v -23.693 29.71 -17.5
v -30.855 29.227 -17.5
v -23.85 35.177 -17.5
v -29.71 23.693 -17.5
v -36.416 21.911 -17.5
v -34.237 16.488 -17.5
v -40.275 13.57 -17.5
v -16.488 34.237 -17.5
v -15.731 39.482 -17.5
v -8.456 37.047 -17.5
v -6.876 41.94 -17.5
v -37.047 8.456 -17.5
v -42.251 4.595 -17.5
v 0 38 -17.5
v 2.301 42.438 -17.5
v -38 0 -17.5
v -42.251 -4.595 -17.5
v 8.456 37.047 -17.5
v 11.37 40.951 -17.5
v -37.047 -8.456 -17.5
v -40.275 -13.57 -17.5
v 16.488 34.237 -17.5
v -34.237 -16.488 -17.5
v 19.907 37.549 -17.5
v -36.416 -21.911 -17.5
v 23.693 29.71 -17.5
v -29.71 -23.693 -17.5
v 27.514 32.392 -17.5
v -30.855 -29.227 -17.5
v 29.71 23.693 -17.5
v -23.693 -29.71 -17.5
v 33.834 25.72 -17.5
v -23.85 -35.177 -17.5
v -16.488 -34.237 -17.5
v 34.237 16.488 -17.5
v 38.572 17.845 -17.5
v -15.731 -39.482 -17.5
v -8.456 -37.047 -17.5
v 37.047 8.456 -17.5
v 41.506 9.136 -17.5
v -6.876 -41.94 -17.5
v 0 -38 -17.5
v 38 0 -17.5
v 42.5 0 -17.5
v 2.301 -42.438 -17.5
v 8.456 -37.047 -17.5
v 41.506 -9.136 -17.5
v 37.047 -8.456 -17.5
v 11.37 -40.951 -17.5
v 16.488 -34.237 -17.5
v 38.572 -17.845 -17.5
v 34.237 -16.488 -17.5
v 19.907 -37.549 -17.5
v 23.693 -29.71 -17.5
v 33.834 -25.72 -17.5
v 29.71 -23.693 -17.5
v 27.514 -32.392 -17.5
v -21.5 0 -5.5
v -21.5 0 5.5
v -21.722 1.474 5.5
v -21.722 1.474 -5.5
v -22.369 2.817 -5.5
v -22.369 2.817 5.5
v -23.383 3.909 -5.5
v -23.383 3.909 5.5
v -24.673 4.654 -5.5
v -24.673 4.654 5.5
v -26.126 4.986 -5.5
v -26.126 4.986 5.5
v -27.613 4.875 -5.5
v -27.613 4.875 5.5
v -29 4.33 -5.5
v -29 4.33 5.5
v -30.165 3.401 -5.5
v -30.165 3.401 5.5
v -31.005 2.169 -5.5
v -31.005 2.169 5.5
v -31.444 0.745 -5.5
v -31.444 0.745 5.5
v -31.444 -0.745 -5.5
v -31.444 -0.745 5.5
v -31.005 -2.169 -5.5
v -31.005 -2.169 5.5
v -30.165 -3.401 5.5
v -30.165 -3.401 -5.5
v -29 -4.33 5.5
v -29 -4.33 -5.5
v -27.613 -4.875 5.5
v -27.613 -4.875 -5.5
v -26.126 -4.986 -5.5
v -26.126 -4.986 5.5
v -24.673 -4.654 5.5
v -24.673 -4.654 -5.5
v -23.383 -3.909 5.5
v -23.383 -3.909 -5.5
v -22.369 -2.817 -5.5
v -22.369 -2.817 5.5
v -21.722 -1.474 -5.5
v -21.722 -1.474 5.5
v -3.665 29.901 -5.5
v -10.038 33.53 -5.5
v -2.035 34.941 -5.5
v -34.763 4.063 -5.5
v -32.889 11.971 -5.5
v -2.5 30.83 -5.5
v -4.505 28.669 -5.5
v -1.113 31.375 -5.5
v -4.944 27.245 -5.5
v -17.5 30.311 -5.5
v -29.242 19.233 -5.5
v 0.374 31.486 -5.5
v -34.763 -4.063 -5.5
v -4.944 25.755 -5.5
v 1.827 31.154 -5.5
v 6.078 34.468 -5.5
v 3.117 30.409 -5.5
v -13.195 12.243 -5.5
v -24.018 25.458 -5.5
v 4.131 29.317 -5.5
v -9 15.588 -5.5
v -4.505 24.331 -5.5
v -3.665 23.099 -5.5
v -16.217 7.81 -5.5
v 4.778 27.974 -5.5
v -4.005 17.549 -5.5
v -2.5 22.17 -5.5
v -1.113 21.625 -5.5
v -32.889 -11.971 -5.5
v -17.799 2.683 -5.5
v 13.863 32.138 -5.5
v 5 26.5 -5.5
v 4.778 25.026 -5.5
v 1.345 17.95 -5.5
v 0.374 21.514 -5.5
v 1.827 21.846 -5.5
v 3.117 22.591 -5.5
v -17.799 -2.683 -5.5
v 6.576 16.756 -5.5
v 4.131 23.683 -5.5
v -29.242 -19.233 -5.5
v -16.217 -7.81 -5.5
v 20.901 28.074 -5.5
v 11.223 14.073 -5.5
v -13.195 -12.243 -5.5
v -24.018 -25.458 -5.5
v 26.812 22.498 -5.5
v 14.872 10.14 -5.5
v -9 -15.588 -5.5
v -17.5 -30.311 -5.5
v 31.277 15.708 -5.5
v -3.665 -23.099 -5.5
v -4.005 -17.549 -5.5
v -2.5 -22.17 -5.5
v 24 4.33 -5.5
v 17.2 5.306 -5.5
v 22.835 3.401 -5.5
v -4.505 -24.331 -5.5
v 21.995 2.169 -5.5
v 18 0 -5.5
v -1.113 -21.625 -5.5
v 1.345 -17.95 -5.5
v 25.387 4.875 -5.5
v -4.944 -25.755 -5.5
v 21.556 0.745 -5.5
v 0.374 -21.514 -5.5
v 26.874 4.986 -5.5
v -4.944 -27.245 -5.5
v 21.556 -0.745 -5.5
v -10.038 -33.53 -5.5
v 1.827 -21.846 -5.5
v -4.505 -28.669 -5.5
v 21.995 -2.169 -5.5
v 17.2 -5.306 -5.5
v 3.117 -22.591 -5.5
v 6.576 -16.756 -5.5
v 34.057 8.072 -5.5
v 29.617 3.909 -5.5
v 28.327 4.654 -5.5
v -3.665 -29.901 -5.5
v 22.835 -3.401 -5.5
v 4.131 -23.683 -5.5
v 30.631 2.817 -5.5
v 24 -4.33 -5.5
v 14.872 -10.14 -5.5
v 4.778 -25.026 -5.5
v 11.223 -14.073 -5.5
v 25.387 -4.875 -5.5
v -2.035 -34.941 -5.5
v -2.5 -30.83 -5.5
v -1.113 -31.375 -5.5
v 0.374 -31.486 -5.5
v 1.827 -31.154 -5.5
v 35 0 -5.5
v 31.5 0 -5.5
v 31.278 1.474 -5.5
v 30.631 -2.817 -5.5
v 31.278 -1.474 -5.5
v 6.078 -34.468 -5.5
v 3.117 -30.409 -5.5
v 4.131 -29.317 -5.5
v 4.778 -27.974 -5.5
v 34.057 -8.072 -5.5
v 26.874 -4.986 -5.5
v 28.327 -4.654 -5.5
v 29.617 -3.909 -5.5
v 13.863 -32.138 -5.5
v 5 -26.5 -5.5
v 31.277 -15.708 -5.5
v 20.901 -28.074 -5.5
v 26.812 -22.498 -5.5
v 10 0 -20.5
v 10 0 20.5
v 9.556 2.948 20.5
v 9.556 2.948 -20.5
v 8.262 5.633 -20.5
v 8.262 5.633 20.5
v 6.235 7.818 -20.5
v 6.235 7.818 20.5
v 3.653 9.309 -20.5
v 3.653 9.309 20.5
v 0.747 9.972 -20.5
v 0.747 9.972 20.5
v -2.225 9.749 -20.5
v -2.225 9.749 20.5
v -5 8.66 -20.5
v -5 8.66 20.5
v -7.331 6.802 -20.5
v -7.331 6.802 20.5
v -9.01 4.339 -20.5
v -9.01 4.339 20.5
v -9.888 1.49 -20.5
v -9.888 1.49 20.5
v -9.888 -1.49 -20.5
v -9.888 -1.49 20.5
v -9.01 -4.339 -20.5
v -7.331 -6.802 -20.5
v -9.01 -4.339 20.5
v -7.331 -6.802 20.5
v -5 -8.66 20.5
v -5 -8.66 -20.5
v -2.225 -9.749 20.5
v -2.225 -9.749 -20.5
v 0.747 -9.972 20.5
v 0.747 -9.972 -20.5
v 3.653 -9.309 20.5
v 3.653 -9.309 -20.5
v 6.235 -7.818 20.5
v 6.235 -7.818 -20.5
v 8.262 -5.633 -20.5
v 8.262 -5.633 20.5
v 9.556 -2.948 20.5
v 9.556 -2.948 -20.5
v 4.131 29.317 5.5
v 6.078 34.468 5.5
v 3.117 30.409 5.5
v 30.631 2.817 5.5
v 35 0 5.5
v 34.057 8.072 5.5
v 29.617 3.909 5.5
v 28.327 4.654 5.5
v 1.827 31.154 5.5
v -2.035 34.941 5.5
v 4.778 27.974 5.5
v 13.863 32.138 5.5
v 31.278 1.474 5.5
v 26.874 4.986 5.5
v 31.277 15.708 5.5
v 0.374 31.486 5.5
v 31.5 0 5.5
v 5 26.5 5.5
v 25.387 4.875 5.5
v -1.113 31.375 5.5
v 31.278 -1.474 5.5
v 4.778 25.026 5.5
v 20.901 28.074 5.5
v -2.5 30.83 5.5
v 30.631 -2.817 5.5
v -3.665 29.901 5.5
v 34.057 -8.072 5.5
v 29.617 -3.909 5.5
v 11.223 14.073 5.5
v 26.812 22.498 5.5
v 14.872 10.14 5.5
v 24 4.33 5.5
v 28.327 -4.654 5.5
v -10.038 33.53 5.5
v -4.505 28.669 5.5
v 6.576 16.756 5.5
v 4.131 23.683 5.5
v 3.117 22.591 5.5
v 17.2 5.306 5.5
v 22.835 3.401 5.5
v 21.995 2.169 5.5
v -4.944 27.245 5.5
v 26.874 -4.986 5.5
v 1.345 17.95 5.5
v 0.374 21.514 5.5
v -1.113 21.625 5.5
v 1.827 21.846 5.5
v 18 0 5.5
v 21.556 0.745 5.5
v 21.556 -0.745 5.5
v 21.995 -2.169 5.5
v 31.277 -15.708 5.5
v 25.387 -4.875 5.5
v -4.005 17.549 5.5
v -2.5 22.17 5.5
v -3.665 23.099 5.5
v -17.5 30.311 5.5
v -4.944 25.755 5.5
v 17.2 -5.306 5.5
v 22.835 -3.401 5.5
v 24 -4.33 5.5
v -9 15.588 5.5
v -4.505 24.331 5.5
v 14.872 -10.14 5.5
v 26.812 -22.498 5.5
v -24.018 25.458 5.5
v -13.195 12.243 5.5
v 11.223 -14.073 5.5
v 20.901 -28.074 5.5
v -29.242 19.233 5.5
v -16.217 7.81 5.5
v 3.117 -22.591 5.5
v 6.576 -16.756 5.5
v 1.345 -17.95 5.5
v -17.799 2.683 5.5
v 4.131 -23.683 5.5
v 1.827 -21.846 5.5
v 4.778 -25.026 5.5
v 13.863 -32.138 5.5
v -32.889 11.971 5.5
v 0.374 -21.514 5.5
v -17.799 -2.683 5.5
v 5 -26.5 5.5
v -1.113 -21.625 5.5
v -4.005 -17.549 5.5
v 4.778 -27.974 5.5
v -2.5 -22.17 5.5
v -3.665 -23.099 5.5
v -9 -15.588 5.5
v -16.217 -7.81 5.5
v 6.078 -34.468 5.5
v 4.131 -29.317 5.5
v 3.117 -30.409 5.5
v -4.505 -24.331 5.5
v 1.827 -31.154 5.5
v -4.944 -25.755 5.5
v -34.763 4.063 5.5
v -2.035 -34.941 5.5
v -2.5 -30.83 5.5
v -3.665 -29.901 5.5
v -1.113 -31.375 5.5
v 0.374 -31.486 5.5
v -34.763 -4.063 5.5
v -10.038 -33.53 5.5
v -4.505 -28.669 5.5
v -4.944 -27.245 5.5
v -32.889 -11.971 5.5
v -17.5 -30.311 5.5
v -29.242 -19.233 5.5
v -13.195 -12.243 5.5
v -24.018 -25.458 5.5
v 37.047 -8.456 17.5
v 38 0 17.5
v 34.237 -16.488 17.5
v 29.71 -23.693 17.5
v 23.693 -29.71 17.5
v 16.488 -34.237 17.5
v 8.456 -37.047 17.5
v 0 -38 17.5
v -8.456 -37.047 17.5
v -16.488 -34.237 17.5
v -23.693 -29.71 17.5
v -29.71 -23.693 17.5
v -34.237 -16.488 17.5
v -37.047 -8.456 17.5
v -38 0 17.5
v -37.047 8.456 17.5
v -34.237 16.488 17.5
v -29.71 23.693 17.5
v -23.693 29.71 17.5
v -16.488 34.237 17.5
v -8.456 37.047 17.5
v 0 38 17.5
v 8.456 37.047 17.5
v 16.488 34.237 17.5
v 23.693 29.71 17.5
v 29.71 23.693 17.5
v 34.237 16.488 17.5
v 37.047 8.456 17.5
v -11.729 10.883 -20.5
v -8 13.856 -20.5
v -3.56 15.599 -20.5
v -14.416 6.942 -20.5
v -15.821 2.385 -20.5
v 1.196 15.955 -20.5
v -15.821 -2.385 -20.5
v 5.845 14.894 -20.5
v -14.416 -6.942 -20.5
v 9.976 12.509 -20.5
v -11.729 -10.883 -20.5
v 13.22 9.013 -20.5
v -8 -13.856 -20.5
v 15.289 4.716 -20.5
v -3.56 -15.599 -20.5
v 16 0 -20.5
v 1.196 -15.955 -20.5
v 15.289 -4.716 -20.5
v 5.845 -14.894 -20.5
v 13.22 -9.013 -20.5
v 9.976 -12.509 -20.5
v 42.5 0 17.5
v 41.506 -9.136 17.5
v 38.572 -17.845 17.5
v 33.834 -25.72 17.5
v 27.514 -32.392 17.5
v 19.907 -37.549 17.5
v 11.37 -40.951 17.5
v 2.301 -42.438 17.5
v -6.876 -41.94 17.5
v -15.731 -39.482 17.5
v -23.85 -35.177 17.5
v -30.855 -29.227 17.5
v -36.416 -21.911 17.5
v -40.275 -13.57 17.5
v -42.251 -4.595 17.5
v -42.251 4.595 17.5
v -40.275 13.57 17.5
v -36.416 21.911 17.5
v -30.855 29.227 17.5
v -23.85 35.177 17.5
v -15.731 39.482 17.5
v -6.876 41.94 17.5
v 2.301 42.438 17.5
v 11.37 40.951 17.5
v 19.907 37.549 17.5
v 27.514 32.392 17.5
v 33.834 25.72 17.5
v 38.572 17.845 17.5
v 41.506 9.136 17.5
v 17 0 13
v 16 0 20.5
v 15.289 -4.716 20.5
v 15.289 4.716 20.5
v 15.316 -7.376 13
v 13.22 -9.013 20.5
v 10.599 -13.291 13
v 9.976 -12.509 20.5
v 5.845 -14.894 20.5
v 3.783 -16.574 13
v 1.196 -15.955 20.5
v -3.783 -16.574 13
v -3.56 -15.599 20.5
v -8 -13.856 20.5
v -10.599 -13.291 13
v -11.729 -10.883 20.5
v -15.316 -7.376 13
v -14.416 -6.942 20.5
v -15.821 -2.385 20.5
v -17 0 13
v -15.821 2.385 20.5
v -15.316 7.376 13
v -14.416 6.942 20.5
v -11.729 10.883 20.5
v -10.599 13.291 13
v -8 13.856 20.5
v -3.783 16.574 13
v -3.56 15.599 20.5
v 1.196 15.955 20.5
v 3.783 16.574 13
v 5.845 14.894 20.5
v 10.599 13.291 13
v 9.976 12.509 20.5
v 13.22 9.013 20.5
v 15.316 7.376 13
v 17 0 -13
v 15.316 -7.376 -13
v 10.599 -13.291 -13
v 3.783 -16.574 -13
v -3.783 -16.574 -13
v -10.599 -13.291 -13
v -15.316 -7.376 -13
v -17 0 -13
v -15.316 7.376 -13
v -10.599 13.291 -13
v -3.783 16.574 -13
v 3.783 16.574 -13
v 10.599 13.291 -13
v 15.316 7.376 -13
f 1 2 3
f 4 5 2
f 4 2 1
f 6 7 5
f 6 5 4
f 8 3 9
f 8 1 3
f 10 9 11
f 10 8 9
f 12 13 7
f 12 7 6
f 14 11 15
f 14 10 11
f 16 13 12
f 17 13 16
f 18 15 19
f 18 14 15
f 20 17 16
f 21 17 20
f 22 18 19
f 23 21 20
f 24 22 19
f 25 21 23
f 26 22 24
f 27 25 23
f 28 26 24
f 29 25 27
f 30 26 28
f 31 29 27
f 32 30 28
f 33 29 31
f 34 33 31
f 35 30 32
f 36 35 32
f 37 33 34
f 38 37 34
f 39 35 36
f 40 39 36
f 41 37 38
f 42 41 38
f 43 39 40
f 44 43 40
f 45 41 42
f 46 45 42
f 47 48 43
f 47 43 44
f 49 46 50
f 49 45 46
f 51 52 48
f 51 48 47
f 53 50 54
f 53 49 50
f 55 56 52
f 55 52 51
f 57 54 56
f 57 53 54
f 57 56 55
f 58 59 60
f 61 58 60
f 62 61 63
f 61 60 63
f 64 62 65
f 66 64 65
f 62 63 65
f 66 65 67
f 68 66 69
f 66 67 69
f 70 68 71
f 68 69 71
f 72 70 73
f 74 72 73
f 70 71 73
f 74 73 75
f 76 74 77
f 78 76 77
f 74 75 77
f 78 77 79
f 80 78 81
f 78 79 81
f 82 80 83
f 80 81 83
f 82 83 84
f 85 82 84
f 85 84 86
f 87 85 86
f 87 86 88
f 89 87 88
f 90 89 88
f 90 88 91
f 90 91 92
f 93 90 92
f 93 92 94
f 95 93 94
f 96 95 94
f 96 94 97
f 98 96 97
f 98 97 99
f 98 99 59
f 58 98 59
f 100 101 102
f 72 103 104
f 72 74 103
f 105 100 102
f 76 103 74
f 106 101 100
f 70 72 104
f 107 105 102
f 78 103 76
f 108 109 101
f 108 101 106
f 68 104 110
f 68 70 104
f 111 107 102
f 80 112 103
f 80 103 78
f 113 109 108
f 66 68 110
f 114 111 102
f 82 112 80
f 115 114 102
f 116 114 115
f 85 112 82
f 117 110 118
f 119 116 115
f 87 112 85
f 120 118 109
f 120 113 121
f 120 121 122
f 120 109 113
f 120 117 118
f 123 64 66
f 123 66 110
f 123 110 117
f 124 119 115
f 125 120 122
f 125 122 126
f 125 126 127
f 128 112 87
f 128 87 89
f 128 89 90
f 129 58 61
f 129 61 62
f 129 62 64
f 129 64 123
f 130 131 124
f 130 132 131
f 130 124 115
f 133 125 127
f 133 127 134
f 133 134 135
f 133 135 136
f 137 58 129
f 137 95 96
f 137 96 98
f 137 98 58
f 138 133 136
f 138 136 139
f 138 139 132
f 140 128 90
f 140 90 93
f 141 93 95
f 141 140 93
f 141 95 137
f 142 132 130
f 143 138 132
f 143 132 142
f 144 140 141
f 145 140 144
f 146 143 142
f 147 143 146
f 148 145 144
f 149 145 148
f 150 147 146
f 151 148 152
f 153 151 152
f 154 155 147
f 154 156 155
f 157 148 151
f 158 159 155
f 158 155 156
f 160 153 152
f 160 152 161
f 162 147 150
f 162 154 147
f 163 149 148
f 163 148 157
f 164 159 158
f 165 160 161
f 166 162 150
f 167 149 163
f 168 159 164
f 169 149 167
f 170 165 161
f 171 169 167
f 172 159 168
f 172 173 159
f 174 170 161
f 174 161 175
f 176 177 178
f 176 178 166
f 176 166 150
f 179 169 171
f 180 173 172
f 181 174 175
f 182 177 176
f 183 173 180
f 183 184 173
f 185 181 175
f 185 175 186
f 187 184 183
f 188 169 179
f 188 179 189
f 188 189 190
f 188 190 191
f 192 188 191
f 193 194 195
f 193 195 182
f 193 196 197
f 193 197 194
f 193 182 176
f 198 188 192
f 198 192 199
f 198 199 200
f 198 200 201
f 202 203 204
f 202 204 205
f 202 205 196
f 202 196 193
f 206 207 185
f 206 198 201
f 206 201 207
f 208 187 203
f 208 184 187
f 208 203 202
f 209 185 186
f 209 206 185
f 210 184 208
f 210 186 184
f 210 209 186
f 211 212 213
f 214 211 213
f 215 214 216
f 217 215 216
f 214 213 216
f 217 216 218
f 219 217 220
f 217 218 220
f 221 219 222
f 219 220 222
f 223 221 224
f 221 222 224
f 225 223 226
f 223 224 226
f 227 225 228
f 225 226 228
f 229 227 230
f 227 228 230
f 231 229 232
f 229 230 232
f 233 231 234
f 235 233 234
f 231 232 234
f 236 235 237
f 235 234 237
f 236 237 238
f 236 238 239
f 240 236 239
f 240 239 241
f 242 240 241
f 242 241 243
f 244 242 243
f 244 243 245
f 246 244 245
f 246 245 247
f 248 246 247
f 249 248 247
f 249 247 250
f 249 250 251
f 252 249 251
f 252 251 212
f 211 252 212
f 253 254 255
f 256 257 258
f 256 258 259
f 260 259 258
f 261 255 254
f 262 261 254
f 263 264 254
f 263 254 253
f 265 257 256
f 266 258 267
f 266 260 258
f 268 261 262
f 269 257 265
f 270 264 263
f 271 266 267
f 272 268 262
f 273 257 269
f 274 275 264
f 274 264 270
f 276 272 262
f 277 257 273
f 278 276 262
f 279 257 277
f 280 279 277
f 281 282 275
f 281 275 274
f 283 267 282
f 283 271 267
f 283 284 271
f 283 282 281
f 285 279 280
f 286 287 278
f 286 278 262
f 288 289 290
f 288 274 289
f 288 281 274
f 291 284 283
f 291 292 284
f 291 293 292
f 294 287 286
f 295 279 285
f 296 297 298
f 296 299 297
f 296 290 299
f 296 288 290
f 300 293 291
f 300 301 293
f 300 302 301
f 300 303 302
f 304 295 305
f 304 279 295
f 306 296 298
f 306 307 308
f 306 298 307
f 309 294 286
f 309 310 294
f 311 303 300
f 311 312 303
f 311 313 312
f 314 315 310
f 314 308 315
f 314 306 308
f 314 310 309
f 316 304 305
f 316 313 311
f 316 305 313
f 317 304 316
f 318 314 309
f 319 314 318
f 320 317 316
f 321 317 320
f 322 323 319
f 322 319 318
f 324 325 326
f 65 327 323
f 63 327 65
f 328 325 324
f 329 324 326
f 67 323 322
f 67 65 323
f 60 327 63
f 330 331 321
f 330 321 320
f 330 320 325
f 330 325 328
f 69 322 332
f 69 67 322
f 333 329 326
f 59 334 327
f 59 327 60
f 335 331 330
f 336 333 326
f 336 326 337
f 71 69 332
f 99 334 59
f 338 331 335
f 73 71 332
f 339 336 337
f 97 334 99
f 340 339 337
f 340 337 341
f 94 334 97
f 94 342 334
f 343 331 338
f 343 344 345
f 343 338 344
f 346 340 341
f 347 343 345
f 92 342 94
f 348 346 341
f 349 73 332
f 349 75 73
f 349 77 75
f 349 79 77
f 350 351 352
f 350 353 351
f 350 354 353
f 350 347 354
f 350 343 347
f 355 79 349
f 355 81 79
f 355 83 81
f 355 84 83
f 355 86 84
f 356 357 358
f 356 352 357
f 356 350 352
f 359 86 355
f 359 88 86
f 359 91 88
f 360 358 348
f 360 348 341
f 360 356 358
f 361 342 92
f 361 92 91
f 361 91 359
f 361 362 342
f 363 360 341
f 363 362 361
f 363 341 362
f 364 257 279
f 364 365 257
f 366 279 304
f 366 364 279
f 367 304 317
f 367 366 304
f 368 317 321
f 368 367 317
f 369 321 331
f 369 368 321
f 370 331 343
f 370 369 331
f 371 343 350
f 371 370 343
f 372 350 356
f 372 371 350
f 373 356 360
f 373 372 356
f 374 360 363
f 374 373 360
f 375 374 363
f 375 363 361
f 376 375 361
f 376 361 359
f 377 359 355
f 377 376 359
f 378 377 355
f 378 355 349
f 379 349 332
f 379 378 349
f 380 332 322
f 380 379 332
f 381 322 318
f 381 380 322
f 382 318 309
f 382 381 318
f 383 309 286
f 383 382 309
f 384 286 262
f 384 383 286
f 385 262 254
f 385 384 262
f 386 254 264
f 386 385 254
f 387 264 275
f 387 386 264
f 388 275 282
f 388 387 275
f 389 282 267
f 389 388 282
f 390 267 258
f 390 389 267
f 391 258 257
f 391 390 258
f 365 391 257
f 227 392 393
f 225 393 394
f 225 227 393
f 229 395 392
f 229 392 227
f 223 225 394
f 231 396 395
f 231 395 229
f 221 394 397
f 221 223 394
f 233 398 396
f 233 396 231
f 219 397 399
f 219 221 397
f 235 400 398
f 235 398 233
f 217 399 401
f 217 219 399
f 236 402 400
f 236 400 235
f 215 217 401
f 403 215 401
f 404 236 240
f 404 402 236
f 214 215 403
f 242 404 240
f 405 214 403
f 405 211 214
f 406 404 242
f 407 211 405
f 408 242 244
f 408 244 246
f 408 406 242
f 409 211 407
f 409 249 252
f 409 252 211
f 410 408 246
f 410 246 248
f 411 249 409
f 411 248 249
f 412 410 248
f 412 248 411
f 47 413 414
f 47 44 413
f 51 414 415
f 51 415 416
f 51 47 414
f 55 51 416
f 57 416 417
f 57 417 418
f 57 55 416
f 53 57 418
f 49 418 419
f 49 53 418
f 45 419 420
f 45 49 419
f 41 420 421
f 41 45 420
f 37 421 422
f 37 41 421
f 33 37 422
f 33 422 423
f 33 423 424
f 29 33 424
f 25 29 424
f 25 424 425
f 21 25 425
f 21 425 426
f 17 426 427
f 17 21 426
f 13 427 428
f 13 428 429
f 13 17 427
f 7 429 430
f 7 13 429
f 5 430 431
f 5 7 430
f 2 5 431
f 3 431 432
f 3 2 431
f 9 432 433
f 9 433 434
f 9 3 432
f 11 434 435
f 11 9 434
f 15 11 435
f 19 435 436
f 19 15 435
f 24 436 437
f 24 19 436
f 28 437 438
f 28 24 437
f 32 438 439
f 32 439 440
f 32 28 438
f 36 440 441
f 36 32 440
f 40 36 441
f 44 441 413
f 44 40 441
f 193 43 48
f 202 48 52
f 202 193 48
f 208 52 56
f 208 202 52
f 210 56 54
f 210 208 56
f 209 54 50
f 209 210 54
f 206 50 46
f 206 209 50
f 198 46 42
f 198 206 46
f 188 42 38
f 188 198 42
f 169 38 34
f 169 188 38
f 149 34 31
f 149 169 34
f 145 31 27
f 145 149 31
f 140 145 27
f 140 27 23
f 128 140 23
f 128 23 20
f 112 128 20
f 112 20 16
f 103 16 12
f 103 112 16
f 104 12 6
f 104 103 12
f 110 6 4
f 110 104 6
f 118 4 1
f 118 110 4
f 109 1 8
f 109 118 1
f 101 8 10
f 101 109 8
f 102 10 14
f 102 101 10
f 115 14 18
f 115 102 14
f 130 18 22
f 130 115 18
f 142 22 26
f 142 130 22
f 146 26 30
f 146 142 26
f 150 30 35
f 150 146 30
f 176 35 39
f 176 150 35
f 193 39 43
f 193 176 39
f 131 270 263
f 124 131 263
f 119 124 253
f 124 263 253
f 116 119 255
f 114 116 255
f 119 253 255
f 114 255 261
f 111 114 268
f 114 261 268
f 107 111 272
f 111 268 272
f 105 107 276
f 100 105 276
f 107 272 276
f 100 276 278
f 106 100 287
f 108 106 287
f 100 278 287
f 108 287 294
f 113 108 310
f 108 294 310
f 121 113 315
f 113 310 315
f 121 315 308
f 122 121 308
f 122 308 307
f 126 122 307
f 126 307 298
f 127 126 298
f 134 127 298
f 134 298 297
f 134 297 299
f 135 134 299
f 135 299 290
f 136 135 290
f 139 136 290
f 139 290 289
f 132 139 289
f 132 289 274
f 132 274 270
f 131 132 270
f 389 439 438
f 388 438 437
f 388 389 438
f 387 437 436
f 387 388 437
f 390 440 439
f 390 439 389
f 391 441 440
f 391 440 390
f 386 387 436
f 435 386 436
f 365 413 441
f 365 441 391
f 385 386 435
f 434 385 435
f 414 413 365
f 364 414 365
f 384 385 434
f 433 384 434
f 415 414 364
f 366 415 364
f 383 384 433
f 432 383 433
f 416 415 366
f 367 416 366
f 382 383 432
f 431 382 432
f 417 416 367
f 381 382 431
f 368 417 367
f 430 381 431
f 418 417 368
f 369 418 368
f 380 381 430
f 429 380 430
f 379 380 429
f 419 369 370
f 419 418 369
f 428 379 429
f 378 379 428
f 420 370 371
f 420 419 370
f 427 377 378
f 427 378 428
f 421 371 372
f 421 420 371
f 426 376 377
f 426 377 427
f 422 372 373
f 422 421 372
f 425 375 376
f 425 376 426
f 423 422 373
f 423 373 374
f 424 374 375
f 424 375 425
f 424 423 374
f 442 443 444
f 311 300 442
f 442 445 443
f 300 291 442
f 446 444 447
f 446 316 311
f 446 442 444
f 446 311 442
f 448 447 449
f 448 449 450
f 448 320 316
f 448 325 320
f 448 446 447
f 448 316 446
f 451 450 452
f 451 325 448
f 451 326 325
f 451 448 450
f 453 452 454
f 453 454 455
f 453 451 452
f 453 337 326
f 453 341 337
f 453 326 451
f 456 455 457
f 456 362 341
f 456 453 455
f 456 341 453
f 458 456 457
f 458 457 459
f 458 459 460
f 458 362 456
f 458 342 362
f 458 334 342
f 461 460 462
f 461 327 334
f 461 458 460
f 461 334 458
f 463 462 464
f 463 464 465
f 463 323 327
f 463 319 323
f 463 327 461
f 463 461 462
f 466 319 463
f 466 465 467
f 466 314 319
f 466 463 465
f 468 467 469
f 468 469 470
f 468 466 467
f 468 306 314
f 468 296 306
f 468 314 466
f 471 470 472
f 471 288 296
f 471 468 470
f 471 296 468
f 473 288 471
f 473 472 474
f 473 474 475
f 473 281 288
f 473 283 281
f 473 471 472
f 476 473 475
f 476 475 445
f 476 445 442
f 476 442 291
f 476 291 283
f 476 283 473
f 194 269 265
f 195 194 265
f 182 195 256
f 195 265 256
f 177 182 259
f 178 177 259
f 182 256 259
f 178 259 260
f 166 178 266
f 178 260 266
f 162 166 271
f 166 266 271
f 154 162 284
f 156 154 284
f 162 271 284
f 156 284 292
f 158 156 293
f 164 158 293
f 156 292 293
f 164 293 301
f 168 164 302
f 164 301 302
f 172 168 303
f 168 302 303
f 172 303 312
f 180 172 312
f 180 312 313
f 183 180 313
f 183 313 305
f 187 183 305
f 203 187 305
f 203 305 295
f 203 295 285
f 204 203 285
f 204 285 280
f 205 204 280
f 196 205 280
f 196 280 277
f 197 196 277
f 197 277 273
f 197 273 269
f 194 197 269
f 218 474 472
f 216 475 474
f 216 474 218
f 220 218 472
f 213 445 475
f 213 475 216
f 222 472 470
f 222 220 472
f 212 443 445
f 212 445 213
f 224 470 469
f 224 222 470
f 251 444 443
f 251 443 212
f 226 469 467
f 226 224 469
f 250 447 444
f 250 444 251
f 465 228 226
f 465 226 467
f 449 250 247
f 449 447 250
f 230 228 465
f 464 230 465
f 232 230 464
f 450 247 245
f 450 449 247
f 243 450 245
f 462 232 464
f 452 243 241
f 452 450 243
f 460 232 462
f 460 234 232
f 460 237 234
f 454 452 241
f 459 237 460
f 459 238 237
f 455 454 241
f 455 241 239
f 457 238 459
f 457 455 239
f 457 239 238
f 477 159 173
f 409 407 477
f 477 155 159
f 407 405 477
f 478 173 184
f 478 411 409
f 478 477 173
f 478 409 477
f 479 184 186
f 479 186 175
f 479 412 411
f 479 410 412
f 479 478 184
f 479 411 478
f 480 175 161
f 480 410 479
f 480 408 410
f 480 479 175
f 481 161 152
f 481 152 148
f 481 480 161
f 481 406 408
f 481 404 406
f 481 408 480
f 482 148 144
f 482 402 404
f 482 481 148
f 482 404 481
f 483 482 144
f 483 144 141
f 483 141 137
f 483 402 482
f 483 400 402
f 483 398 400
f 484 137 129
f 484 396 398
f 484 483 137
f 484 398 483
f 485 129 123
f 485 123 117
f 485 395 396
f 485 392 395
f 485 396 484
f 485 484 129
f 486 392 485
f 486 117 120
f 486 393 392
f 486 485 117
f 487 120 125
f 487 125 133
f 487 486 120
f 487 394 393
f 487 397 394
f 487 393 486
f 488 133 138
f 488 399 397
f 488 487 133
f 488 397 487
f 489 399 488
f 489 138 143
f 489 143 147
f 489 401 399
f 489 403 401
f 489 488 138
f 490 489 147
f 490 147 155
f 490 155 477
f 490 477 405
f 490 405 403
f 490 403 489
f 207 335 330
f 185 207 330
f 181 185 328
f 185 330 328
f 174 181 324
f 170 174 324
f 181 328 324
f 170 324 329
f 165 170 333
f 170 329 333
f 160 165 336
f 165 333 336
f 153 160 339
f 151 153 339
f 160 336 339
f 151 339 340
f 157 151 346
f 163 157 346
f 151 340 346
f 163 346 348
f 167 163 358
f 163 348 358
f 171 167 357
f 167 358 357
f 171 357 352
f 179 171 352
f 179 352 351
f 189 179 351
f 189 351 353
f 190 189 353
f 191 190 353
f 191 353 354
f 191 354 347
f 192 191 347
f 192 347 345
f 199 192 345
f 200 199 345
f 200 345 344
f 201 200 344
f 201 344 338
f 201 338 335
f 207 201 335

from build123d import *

# Parameters (mm, degrees)
SKETCH3_R          = 10
SKETCH3_R_2        = 5
CUT_EXTRUDE1_DEPTH = 73.756443014


with BuildPart() as part:
    # Sketch2 → Revolve1 (revolve)
    with BuildSketch(Plane(origin=(0, 0, 0), x_dir=(0, 0, -1), z_dir=(1, 0, 0)), mode=Mode.PRIVATE) as revolve1_sk:
        Polygon((-17.5, 42.5), (17.5, 42.5), (17.5, 38), (5.5, 35), (5.5, 18), (20.5, 16), (20.5, 0), (-20.5, 0), (-20.5, 16), (-5.5, 18), (-5.5, 35), (-17.5, 38), align=None)
    revolve(revolve1_sk.sketch.rotate(Axis((0, 0, 152.018729057), (0, 0, -1)), 90), axis=Axis((0, 0, 152.018729057), (0, 0, -1)))

    # Sketch3 → Cut-Extrude1 (cut, through all)
    with BuildSketch(Plane.XY.offset(20.5)):
        Circle(SKETCH3_R)
        with Locations((0, 26.5)):
            Circle(SKETCH3_R_2)
        with Locations((26.5, 0)):
            Circle(SKETCH3_R_2)
        with Locations((0, -26.5)):
            Circle(SKETCH3_R_2)
        with Locations((-26.5, 0)):
            Circle(SKETCH3_R_2)
    extrude(amount=-CUT_EXTRUDE1_DEPTH, mode=Mode.SUBTRACT)


solid = part.part
